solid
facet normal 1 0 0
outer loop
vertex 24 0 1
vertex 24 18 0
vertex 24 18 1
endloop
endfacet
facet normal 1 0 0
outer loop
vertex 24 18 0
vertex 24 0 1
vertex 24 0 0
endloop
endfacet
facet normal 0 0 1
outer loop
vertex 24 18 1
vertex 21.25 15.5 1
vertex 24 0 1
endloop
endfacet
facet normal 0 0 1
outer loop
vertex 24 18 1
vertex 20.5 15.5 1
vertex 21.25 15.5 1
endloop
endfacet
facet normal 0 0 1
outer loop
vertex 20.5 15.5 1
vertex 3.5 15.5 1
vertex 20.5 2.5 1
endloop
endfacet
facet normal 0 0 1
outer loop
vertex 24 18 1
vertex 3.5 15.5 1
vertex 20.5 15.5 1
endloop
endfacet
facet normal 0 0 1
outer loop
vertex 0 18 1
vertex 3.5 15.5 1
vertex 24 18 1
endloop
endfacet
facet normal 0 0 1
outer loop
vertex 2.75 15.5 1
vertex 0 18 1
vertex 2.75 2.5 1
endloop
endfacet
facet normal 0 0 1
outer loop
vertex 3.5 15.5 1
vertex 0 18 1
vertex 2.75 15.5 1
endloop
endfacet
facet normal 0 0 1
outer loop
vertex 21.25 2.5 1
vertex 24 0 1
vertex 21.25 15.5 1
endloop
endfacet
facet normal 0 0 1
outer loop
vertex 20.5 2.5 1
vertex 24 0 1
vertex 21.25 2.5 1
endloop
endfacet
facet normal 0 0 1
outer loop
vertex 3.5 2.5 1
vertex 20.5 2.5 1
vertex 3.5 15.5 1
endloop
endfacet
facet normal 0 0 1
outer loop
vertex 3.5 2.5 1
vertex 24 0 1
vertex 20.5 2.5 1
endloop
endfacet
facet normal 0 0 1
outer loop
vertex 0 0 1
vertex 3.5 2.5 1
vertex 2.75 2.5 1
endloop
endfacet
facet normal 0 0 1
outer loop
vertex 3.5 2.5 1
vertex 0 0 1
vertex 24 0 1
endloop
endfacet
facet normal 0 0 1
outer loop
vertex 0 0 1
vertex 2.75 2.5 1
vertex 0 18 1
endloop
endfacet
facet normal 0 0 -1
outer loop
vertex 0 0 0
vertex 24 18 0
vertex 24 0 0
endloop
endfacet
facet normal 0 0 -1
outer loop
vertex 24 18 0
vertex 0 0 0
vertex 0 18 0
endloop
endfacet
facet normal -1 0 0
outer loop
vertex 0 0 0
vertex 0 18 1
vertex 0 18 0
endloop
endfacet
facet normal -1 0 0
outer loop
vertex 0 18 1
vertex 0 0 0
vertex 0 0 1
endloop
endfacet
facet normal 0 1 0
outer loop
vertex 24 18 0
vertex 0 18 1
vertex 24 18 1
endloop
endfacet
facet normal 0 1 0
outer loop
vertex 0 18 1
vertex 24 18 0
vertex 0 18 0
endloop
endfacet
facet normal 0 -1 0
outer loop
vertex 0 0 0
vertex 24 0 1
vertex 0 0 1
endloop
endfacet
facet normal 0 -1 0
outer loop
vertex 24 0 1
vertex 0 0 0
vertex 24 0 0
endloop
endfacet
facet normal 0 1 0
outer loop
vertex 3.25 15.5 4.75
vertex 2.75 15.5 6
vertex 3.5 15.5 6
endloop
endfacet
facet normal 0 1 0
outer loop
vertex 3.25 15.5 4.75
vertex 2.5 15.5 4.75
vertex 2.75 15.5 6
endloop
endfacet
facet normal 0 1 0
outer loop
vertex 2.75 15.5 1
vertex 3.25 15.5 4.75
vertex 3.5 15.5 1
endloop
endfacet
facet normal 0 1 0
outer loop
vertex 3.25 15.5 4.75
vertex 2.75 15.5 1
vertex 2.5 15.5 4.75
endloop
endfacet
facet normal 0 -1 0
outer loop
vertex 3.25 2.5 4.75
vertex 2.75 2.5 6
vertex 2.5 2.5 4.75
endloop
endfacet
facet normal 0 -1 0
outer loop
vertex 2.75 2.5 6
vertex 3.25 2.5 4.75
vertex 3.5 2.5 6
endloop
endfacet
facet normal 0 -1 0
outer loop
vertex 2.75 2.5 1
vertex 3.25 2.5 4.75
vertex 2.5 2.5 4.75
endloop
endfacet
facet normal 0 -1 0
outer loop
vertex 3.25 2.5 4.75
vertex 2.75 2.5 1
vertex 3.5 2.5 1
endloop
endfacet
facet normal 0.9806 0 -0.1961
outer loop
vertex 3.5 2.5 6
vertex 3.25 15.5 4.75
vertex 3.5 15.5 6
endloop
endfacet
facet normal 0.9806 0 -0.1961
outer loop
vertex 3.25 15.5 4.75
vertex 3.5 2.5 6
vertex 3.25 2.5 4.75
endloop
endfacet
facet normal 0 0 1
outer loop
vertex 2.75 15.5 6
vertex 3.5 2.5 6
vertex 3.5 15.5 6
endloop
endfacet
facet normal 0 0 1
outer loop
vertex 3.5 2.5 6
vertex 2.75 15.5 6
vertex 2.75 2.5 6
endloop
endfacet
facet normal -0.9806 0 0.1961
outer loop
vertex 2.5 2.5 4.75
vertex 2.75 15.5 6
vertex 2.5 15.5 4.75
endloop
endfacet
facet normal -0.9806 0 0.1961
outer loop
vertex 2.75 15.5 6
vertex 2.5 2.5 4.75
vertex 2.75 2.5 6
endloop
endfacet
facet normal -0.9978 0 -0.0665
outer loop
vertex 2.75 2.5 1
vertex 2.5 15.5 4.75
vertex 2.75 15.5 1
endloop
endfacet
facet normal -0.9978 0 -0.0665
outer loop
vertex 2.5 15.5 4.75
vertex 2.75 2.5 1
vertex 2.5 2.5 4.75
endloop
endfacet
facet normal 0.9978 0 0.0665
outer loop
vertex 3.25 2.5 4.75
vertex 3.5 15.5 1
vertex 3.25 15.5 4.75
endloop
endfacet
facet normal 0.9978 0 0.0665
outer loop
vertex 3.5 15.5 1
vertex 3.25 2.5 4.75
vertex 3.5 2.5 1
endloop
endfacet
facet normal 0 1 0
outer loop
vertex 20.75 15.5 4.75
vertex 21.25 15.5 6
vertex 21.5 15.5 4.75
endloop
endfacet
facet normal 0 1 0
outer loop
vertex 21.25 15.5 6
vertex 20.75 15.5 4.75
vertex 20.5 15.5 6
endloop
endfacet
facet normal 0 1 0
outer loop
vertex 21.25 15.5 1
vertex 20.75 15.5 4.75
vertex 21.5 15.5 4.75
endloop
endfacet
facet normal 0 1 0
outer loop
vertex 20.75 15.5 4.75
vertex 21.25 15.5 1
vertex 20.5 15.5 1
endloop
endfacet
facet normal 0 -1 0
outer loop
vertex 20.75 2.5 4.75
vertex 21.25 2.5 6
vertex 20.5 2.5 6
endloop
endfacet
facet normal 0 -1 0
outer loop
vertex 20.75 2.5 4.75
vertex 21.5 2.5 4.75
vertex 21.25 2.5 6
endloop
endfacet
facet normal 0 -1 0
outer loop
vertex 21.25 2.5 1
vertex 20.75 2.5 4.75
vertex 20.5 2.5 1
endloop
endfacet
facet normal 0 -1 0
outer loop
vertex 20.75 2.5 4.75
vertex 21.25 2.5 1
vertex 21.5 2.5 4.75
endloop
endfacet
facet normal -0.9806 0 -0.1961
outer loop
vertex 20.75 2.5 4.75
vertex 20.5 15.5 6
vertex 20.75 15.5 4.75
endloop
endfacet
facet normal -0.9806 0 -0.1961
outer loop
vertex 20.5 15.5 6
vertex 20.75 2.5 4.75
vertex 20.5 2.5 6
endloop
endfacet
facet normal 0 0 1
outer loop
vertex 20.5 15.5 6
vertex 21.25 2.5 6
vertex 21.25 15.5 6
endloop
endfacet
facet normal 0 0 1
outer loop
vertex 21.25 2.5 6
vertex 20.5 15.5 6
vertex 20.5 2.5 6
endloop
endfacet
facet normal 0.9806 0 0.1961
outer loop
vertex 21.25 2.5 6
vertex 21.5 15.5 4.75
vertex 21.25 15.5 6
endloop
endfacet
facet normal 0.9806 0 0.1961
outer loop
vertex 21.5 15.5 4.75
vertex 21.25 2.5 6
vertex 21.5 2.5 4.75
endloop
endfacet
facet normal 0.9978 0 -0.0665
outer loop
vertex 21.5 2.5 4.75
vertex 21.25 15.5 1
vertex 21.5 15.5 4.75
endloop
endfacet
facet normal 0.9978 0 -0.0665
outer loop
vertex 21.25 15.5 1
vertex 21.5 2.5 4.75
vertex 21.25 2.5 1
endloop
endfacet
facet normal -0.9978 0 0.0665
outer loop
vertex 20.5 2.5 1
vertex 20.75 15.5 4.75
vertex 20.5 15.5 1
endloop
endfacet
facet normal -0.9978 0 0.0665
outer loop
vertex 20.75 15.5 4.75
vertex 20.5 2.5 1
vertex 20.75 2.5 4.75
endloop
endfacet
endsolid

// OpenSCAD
// Power Switch Cover
//
// After installing the power switch extension cable, I now have a hole in the
// electronics enclosure where the powerswitch used to be. This is a small cover
// to, well, cover it.

width  = 20;
height = 14;

material = 1;

overhang = 2;
gap      = 0.5;

union() {
    cube([
        width + 2 * overhang,
        height + 2 * overhang,
        material
    ]);

    translate([overhang + gap, 0, 0])
    thing();

    translate([width + overhang - gap, 0, 0])
    mirror([1, 0, 0])
    thing();
}

// This is the part that extends into the electronics enclosure and keeps the
// cover in place. No idea what to call it.
module thing() {
    depth = 5;

    translate([0, overhang - gap + height, material])
    rotate([90, 0, 0])
    linear_extrude(height - gap * 2)
    polygon([
        [ material * 0.25, 0.0],
        [ material       , 0.0],
        [ material * 0.75, depth * 0.75],
        [ material       , depth],
        [ material * 0.25, depth],
        [            0.0 , depth * 0.75],
    ]);
}
